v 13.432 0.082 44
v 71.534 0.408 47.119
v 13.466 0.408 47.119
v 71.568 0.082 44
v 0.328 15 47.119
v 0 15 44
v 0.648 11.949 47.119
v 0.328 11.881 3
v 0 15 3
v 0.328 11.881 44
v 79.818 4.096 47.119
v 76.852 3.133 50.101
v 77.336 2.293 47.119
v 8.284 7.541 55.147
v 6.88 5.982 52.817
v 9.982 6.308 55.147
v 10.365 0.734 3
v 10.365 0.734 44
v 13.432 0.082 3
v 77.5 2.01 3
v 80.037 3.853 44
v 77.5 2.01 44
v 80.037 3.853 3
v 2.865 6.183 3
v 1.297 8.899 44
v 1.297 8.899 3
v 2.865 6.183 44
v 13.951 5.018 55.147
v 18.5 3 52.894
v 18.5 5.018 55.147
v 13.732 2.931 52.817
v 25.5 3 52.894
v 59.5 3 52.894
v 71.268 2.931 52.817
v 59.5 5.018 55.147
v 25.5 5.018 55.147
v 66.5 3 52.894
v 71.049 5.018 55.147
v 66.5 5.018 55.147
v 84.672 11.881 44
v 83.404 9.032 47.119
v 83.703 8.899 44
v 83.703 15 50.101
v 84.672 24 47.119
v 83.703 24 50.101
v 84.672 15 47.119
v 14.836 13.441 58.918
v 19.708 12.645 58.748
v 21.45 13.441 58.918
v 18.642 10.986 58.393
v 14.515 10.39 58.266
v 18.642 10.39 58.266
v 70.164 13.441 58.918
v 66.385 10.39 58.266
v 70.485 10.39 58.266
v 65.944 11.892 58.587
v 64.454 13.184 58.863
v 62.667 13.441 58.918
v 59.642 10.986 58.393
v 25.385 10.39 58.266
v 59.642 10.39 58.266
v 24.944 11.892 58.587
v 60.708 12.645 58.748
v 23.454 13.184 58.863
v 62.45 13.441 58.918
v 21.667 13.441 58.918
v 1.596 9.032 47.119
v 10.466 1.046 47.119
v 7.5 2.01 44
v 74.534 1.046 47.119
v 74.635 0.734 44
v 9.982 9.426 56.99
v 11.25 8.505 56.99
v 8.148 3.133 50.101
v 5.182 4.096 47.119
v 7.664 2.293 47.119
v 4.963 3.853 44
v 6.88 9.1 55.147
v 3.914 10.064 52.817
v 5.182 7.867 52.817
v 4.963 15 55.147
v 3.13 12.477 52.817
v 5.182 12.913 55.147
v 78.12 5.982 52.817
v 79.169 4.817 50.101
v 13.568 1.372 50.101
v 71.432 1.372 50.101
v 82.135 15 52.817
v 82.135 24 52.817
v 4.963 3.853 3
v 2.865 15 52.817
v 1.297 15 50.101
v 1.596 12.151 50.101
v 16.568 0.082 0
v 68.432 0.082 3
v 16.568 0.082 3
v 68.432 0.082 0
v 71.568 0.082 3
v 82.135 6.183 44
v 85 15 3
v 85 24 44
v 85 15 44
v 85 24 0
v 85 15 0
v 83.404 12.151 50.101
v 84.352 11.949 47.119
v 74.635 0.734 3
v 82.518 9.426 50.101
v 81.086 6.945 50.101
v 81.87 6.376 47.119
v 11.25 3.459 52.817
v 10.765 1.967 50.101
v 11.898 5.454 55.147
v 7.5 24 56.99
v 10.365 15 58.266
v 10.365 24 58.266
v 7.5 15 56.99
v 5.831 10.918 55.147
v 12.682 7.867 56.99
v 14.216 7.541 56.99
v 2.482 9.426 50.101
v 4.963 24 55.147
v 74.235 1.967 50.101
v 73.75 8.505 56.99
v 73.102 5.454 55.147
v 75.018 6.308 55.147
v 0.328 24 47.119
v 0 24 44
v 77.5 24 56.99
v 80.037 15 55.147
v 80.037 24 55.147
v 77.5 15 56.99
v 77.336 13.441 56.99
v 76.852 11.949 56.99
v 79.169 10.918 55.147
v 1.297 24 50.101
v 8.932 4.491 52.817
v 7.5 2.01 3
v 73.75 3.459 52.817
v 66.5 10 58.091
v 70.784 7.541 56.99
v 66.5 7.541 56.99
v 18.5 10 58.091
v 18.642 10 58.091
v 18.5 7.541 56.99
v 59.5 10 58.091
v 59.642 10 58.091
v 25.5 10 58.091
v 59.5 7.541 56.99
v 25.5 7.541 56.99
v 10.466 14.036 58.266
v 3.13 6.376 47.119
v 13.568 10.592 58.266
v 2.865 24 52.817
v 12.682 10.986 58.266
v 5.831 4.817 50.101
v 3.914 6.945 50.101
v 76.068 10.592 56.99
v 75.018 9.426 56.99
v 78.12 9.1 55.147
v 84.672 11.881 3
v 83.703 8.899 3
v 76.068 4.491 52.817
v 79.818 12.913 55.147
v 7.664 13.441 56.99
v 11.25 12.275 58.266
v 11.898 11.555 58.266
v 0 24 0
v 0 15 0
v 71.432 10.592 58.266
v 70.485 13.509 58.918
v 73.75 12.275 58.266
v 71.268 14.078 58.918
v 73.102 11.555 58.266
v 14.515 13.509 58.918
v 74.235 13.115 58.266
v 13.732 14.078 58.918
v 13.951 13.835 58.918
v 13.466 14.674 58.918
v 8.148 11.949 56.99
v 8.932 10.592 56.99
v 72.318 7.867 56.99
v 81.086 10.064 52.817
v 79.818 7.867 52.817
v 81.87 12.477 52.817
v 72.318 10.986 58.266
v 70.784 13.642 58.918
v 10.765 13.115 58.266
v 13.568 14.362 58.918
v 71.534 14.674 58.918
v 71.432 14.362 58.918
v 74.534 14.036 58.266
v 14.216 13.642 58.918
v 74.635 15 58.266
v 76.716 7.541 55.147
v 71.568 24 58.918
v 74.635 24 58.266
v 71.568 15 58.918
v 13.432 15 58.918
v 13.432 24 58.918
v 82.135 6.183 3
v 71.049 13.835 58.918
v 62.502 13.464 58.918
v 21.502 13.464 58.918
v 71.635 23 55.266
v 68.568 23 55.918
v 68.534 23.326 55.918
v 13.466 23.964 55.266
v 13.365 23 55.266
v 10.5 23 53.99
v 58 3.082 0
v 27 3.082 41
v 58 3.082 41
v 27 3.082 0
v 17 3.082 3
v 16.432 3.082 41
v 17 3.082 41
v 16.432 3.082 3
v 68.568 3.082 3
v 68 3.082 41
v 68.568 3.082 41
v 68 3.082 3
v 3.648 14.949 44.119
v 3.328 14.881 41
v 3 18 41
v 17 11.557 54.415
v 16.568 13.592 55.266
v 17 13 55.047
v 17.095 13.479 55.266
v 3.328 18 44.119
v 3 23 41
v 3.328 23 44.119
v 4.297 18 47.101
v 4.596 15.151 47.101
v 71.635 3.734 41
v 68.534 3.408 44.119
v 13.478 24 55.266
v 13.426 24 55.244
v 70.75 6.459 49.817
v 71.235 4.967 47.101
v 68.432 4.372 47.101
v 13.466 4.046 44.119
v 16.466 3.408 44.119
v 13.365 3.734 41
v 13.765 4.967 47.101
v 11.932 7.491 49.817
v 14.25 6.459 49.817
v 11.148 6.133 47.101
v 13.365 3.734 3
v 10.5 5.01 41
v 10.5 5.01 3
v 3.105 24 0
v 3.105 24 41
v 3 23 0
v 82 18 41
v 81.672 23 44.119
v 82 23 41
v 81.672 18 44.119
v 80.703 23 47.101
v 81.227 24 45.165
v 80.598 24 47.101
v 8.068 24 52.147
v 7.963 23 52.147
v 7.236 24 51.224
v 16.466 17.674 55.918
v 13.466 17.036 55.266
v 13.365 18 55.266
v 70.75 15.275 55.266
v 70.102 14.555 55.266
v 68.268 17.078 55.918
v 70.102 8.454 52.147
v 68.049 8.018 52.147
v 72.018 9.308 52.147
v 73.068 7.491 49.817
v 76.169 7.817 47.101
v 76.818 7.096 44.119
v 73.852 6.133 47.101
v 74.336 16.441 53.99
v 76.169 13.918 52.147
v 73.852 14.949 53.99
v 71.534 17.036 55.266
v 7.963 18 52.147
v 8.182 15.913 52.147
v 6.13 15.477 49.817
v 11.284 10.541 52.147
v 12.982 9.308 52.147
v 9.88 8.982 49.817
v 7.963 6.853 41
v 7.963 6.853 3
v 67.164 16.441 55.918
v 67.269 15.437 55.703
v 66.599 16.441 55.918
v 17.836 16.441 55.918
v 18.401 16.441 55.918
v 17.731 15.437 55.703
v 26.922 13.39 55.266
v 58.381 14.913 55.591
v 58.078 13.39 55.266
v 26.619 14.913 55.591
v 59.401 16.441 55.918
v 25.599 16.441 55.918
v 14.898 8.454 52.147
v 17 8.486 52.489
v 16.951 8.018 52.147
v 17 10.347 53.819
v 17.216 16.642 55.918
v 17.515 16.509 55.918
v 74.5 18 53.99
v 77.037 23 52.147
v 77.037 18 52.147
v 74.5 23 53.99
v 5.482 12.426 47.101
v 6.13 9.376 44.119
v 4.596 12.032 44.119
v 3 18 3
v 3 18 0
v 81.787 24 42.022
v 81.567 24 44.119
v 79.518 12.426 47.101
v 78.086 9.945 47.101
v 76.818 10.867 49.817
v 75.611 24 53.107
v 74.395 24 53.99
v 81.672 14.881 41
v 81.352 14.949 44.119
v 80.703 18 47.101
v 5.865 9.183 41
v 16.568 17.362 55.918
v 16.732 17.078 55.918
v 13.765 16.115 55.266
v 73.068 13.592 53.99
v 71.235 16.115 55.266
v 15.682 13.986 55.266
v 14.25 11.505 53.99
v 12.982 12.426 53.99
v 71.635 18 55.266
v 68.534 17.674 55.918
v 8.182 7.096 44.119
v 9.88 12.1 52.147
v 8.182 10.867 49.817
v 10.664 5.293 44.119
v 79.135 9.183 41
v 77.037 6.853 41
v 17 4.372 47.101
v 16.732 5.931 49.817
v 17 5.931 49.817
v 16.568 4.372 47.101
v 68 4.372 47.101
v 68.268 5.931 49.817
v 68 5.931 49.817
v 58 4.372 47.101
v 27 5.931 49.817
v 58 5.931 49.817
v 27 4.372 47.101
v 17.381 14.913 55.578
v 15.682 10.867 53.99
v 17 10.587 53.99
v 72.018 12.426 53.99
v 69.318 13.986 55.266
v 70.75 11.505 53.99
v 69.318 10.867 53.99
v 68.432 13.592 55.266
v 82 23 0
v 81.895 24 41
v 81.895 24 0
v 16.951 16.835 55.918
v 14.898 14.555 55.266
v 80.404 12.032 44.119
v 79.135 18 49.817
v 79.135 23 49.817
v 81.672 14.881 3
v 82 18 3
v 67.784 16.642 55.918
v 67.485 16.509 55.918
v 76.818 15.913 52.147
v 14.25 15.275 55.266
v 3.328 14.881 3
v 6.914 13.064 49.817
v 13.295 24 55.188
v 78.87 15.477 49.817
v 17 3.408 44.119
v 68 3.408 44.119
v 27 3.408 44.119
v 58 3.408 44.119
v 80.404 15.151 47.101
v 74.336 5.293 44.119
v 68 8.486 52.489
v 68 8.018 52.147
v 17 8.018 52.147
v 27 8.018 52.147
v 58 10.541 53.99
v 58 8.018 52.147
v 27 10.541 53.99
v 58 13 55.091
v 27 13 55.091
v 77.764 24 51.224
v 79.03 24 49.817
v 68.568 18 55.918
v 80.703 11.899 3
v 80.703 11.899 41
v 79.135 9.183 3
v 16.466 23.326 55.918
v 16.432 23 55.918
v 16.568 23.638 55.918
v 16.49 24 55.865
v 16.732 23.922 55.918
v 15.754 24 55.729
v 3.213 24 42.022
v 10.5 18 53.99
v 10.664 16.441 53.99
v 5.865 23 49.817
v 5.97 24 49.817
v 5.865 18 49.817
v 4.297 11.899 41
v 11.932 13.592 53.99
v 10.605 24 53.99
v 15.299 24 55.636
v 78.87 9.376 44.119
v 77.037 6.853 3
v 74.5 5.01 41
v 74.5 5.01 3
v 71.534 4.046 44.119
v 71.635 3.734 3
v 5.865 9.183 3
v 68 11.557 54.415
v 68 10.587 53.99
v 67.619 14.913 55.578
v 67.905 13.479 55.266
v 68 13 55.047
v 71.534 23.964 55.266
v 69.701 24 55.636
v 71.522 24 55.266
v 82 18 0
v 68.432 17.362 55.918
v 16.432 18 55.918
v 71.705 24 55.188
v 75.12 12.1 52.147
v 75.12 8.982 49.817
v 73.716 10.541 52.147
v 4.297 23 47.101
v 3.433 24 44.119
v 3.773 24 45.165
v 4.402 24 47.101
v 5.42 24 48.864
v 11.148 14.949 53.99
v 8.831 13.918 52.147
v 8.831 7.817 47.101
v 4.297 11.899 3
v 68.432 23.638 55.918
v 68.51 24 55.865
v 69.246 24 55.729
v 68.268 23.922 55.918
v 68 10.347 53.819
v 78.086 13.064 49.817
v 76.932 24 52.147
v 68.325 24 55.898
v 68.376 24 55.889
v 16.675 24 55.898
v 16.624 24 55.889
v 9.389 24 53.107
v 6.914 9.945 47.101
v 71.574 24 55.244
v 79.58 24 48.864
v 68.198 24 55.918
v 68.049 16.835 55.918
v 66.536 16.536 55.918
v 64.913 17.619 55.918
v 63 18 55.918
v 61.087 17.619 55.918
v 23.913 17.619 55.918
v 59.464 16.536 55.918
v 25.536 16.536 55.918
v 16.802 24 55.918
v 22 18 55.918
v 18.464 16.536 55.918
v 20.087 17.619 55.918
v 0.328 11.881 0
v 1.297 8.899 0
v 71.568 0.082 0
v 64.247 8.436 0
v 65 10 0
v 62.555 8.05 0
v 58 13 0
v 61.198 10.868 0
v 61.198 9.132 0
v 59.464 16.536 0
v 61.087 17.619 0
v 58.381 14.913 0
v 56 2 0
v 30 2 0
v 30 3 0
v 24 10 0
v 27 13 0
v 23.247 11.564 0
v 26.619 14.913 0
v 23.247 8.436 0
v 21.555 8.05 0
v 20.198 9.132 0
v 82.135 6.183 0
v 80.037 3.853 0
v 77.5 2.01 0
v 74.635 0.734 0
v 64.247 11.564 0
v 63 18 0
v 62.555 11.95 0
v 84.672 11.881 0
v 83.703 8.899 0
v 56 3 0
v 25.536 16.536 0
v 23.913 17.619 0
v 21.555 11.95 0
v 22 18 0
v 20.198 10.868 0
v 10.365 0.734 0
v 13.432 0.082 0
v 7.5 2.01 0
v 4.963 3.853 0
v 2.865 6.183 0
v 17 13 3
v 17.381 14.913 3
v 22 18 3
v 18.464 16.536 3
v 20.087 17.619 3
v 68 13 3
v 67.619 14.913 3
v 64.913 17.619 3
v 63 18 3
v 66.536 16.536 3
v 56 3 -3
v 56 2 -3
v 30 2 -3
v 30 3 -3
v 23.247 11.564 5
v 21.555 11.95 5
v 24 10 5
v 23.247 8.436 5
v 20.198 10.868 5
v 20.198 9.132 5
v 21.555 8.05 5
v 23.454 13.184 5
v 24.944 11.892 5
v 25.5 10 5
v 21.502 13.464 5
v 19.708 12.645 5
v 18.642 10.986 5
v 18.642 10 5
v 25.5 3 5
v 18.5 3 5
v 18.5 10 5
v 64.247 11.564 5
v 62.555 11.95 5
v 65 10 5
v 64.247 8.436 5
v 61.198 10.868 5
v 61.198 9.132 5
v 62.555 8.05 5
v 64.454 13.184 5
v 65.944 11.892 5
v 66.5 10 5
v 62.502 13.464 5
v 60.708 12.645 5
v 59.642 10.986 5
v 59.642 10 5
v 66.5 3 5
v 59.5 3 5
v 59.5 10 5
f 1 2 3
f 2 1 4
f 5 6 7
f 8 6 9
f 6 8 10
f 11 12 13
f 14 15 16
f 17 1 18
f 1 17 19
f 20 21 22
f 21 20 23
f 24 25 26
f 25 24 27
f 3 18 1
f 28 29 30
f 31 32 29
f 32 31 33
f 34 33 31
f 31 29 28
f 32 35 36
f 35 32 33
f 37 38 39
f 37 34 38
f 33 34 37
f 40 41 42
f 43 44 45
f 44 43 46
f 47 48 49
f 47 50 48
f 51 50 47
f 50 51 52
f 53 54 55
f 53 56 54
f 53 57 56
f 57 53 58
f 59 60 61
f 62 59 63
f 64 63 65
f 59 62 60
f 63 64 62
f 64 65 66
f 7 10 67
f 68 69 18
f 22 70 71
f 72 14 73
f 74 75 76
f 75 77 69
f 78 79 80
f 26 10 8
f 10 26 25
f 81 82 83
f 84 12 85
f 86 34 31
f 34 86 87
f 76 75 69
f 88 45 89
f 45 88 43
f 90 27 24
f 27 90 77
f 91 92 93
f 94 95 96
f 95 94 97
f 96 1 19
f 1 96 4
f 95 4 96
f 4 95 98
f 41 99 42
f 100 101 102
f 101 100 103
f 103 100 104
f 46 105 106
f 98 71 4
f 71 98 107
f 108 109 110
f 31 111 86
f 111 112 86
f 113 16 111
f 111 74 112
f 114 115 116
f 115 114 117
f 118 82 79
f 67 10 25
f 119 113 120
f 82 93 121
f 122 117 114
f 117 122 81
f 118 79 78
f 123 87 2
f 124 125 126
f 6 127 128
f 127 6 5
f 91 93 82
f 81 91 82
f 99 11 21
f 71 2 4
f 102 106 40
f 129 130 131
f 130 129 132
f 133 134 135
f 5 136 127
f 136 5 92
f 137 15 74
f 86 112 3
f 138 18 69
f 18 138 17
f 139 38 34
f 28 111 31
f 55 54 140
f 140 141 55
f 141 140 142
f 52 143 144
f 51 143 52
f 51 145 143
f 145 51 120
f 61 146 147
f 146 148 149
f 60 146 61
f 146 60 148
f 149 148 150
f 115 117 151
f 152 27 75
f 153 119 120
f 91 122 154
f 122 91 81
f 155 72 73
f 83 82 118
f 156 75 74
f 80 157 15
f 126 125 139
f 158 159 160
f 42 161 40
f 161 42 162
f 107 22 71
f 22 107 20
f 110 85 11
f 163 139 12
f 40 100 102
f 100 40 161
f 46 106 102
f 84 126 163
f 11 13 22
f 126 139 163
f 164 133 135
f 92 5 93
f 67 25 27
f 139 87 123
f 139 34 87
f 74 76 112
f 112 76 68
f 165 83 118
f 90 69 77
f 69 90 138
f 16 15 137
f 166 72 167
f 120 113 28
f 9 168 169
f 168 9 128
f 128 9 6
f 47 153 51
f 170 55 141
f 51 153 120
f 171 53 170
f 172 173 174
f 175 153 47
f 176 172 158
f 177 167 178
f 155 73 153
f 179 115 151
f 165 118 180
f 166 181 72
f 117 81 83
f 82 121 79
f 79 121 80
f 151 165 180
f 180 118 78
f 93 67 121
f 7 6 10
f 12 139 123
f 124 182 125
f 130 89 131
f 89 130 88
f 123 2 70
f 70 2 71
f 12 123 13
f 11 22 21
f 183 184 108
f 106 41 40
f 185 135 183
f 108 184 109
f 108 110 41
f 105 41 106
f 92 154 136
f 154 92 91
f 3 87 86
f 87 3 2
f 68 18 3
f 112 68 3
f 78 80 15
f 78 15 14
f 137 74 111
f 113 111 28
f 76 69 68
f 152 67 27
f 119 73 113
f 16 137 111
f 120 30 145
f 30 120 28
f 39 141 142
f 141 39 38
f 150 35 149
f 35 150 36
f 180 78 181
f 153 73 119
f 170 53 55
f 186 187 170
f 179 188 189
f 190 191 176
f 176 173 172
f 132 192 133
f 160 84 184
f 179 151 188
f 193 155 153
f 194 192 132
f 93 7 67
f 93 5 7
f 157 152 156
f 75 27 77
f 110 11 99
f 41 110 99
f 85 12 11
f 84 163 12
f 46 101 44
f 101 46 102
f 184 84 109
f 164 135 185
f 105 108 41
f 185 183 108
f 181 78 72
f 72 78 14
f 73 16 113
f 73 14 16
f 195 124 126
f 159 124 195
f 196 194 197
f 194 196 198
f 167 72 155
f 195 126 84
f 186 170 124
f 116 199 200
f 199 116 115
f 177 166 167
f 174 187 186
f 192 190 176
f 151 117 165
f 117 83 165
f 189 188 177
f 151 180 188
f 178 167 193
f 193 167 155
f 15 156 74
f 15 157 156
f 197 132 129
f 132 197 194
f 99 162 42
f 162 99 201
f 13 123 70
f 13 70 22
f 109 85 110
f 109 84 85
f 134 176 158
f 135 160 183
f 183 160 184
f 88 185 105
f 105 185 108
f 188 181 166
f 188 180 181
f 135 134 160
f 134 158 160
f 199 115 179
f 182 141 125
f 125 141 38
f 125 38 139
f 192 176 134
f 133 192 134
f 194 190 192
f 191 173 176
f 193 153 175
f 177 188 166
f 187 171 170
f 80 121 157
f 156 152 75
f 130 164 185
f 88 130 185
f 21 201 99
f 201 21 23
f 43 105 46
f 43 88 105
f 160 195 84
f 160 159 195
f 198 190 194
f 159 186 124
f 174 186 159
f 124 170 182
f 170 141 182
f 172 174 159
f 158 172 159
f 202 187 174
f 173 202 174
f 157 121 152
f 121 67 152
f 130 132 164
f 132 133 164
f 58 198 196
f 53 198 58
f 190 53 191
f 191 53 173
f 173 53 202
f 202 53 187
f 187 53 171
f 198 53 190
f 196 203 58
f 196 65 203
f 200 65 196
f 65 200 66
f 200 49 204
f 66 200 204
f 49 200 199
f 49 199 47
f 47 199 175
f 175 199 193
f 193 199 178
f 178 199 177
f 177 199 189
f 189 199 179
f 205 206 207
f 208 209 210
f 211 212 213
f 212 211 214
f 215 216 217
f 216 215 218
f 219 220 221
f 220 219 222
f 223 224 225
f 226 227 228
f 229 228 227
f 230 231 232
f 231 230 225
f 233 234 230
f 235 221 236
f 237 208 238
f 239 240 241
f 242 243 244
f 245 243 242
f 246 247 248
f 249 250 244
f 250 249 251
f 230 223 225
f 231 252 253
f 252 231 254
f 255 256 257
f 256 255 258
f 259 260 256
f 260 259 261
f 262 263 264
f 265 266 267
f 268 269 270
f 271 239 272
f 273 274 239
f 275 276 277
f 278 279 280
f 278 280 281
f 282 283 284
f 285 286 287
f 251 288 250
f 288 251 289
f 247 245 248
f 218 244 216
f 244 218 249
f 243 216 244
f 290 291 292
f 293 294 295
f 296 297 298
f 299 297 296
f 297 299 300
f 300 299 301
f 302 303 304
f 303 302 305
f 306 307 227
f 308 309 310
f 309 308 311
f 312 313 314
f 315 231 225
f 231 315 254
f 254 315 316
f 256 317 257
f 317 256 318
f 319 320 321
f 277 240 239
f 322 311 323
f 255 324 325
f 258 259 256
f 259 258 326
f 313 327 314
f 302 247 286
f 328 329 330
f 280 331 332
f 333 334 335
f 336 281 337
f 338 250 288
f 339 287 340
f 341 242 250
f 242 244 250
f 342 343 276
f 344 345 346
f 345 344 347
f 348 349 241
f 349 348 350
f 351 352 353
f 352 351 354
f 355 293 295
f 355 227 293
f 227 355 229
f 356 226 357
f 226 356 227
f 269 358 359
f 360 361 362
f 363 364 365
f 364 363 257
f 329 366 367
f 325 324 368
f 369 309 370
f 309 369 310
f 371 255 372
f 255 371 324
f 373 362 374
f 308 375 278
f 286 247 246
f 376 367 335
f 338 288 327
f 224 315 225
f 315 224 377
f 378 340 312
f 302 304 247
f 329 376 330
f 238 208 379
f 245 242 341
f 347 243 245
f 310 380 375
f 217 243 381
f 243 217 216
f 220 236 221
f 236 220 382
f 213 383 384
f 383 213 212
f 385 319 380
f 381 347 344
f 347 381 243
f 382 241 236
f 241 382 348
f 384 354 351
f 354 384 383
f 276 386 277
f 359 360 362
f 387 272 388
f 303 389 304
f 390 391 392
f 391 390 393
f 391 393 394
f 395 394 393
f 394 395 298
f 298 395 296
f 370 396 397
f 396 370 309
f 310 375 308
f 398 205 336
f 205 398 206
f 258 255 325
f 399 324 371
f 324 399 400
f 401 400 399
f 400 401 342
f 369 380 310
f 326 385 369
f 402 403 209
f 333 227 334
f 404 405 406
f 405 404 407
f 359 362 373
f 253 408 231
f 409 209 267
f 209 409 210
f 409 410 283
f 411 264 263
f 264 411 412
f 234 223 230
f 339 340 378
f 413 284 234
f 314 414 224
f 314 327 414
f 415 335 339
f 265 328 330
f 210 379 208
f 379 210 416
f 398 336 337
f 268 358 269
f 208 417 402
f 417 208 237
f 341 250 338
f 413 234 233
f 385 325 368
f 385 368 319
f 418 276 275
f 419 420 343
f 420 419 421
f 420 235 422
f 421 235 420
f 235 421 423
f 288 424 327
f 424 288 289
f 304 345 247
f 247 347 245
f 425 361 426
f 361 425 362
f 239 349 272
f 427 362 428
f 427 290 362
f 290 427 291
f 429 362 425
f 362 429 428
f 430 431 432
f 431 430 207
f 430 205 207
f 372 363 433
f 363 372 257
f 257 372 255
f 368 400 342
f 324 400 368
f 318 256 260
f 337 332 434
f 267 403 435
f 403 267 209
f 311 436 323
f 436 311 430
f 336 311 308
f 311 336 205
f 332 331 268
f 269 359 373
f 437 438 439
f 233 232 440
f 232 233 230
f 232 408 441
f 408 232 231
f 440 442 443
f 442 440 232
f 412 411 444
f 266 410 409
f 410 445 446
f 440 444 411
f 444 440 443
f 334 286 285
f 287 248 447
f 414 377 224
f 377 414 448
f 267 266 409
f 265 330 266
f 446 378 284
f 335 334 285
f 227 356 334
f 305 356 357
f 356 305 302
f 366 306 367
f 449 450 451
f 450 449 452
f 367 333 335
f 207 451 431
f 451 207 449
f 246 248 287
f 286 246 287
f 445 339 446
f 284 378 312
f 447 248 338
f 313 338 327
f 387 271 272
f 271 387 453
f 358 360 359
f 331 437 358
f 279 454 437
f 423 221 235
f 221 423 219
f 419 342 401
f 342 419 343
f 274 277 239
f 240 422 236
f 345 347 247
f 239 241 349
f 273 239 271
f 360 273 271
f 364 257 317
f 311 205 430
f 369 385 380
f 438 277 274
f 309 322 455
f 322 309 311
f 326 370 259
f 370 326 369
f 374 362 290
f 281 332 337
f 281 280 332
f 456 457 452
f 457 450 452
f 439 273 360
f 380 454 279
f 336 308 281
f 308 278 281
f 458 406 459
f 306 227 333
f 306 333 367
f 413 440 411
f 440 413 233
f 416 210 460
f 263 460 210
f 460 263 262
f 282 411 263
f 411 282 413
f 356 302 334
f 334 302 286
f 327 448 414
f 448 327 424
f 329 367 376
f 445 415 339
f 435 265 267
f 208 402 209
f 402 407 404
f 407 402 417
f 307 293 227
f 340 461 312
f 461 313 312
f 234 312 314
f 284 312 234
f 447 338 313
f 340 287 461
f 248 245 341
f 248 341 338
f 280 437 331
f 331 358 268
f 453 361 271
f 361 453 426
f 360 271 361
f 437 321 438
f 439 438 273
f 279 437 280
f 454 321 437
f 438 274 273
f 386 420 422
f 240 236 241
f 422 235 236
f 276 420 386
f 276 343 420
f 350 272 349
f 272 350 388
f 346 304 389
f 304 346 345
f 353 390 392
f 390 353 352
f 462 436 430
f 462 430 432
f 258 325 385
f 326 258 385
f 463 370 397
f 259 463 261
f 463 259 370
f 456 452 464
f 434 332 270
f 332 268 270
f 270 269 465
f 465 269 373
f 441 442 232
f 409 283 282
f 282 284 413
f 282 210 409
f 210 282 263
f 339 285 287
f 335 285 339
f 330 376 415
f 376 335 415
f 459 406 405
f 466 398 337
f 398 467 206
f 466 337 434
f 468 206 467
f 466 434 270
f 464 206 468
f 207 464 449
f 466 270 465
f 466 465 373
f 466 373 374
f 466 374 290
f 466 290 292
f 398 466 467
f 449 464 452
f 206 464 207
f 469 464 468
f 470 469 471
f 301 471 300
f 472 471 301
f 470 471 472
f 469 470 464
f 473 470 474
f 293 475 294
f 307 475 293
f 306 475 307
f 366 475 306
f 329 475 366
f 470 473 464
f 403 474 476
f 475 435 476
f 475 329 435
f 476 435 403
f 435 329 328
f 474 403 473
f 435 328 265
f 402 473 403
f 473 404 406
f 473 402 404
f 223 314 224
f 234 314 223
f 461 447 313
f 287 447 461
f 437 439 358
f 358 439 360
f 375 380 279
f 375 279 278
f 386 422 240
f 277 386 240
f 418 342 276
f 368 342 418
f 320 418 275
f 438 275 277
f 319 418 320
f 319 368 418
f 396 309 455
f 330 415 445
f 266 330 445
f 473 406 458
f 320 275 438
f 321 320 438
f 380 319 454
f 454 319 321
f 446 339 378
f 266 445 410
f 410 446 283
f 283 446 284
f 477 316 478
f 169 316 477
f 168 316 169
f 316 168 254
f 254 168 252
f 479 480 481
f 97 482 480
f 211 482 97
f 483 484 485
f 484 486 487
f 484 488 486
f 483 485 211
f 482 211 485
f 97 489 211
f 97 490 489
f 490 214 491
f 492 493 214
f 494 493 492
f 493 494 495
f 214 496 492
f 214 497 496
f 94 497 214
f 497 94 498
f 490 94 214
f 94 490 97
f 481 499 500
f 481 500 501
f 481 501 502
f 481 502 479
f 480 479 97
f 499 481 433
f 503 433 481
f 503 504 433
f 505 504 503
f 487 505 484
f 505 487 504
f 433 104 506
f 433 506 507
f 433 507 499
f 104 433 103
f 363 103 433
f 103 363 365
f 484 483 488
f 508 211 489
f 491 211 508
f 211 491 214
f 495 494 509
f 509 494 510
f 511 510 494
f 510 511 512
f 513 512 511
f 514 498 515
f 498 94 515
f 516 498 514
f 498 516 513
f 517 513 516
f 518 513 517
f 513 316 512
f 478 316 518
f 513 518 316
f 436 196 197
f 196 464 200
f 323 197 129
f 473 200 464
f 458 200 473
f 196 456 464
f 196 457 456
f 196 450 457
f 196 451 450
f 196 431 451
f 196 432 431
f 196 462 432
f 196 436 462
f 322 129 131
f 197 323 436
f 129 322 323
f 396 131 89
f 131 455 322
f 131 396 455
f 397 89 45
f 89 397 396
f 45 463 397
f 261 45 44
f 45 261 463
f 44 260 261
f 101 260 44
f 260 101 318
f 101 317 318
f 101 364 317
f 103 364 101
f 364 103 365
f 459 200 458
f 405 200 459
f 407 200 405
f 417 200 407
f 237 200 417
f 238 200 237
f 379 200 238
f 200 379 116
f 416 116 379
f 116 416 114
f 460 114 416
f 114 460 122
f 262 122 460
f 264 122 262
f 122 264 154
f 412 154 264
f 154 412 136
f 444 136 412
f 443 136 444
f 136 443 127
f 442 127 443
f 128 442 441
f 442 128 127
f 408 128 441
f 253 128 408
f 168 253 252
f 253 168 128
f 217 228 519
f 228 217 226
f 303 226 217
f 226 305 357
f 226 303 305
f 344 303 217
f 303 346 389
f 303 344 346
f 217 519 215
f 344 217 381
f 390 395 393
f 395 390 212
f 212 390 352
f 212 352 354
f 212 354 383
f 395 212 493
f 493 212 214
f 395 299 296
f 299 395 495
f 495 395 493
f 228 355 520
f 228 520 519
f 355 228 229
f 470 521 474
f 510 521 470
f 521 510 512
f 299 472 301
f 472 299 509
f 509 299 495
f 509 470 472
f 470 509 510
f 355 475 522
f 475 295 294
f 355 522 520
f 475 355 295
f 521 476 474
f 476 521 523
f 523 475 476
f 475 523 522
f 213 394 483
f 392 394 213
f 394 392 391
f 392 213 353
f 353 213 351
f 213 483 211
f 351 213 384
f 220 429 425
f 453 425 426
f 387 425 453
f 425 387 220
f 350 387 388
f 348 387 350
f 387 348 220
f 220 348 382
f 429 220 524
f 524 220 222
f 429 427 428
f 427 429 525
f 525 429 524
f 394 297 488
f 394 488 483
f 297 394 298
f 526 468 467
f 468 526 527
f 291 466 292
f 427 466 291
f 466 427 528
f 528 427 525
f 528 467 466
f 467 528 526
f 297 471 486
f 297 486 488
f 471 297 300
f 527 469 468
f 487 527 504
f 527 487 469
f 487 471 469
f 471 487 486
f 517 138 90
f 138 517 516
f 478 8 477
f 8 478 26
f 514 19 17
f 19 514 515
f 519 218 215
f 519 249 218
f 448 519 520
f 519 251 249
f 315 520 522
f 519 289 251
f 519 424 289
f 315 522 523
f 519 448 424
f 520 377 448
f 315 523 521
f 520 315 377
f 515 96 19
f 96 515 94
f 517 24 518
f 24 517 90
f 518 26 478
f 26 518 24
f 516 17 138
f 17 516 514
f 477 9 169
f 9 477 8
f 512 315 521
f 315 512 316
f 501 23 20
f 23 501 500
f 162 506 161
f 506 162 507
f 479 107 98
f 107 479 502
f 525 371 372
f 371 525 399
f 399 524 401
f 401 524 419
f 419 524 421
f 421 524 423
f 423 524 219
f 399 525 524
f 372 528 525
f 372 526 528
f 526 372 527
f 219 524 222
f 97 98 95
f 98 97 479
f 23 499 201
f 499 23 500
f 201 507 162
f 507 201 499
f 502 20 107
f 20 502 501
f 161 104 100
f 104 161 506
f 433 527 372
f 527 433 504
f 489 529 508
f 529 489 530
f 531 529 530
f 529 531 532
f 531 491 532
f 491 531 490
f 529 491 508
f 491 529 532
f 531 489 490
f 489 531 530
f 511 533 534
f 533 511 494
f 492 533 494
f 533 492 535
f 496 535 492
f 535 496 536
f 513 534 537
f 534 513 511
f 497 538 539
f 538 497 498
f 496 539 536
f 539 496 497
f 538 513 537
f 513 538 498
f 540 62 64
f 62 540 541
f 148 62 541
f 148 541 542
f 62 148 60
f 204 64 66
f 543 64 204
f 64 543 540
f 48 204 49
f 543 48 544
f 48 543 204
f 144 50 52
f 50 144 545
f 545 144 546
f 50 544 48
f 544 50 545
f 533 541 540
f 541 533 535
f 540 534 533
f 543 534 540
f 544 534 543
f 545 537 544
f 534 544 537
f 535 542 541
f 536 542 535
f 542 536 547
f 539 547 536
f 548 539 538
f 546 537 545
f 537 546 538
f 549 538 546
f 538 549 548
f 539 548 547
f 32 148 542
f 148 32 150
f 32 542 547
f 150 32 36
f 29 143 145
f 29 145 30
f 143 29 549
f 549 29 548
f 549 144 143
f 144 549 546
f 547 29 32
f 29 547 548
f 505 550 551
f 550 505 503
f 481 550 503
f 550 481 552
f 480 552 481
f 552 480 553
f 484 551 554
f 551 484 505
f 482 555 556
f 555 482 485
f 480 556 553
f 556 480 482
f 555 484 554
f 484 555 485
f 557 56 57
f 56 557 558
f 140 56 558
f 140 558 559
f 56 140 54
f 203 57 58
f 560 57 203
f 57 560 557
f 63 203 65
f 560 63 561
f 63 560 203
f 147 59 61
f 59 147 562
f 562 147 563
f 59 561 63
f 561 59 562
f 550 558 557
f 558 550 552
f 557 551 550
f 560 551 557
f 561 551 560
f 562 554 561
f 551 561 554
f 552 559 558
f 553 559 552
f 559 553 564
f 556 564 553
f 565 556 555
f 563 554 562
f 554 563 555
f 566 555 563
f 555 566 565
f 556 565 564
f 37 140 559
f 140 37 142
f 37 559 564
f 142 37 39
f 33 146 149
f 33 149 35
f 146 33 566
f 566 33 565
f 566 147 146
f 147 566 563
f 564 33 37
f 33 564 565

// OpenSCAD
inner_width = 79; // Inner width in milimeters.
inner_height = 56; // Inner height in milimeters.
inner_depth = 20; // Inner depth in milimeters.
wall_thickness = 3; // Wall thickness in milimeters.
rounding_radius = 15;

// $fn = 64;

// TODO:
// - Make lid for pipes at top

module roundedCube(extraSize = 0) {
  // Adjust the location since the sphere builds out the cube.  Then
  // use minkowski and a sphere to make a rounded cube.
  translate([rounding_radius,rounding_radius,0]) minkowski() {
    // Make a cube matching the inner sizes on the width, height and
    // depth, but remove some of the rounding radius to make it the
    // correct size.
    cube([
      inner_width-rounding_radius*2+extraSize,
      inner_depth-rounding_radius+extraSize,
      inner_height-rounding_radius+extraSize
    ]);
    sphere(r=rounding_radius);
  }
}

module roundedShell() {
  // Make a rounded shell.
  intersection() {
    // So here we make two rounded cubes, one bigger and one smaller
    // and takes the difference of those. This way we get an empty
    // rounded cube.
    translate([wall_thickness,wall_thickness]) difference() {
      translate([-wall_thickness, -wall_thickness, -wall_thickness]) roundedCube(wall_thickness*2);
      roundedCube();
    }
    // Then we use intersection and a cube to only keep the part of
    // the shell that we want to have.
    translate([-1,-1,0]) cube([
      inner_width+wall_thickness*2+2,
      inner_depth+wall_thickness+2,
      inner_height+wall_thickness+2
    ]);
  }
}

module pipes() {
  intersection() {
    // Make two pipes out of a cube and a cylinder.
    union() {
      hull() {
        translate([17,1,0]) cube([10, 7, inner_height+wall_thickness+1]);
        translate([22,13,0]) cylinder(d=10, h=inner_height+wall_thickness+1);
      }
      translate([41,0,0]) hull() {
        translate([17,1,0]) cube([10, 7, inner_height+wall_thickness+1]);
        translate([22,13,0]) cylinder(d=10, h=inner_height+wall_thickness+1);
      }
    }
    // Generate a rounded cube and intersect it with the pipes to make
    // them flush against the shell.
    translate([-wall_thickness, wall_thickness, -wall_thickness]) roundedCube(wall_thickness*2);
  }
}

module pipeHoles() {
  union() {
    // First pipe
    translate([22,10,-1]) cylinder(d=4, h=7, center=false);
    translate([22,10,5]) cylinder(d=7, h=inner_height, center=false);
    translate([18.5,3,5]) cube([7, 7, inner_height]);
    // Second pipe
    translate([41+22,10,-1]) cylinder(d=4, h=7, center=false);
    translate([41+22,10,5]) cylinder(d=7, h=inner_height, center=false);
    translate([41+18.5,3,5]) cube([7, 7, inner_height]);
  }
}

module bottomWalls() {
  intersection() {
    translate([15,15,0]) cylinder(r=15, h=3, center=false);
    translate([0,0,-1]) cube([22,18,5]);
  }
  translate([85,0,0]) mirror([1,0,0]) intersection() {
    translate([15,15,0]) cylinder(r=15, h=3, center=false);
    translate([0,0,-1]) cube([22,18,5]);
  }
}

module bottomRidge() {
  translate([30,2,-3]) cube([26,1,4]);
}

difference() {
  union() {
    roundedShell();
    pipes();
    bottomWalls();
    bottomRidge();
  }
  pipeHoles();
}
